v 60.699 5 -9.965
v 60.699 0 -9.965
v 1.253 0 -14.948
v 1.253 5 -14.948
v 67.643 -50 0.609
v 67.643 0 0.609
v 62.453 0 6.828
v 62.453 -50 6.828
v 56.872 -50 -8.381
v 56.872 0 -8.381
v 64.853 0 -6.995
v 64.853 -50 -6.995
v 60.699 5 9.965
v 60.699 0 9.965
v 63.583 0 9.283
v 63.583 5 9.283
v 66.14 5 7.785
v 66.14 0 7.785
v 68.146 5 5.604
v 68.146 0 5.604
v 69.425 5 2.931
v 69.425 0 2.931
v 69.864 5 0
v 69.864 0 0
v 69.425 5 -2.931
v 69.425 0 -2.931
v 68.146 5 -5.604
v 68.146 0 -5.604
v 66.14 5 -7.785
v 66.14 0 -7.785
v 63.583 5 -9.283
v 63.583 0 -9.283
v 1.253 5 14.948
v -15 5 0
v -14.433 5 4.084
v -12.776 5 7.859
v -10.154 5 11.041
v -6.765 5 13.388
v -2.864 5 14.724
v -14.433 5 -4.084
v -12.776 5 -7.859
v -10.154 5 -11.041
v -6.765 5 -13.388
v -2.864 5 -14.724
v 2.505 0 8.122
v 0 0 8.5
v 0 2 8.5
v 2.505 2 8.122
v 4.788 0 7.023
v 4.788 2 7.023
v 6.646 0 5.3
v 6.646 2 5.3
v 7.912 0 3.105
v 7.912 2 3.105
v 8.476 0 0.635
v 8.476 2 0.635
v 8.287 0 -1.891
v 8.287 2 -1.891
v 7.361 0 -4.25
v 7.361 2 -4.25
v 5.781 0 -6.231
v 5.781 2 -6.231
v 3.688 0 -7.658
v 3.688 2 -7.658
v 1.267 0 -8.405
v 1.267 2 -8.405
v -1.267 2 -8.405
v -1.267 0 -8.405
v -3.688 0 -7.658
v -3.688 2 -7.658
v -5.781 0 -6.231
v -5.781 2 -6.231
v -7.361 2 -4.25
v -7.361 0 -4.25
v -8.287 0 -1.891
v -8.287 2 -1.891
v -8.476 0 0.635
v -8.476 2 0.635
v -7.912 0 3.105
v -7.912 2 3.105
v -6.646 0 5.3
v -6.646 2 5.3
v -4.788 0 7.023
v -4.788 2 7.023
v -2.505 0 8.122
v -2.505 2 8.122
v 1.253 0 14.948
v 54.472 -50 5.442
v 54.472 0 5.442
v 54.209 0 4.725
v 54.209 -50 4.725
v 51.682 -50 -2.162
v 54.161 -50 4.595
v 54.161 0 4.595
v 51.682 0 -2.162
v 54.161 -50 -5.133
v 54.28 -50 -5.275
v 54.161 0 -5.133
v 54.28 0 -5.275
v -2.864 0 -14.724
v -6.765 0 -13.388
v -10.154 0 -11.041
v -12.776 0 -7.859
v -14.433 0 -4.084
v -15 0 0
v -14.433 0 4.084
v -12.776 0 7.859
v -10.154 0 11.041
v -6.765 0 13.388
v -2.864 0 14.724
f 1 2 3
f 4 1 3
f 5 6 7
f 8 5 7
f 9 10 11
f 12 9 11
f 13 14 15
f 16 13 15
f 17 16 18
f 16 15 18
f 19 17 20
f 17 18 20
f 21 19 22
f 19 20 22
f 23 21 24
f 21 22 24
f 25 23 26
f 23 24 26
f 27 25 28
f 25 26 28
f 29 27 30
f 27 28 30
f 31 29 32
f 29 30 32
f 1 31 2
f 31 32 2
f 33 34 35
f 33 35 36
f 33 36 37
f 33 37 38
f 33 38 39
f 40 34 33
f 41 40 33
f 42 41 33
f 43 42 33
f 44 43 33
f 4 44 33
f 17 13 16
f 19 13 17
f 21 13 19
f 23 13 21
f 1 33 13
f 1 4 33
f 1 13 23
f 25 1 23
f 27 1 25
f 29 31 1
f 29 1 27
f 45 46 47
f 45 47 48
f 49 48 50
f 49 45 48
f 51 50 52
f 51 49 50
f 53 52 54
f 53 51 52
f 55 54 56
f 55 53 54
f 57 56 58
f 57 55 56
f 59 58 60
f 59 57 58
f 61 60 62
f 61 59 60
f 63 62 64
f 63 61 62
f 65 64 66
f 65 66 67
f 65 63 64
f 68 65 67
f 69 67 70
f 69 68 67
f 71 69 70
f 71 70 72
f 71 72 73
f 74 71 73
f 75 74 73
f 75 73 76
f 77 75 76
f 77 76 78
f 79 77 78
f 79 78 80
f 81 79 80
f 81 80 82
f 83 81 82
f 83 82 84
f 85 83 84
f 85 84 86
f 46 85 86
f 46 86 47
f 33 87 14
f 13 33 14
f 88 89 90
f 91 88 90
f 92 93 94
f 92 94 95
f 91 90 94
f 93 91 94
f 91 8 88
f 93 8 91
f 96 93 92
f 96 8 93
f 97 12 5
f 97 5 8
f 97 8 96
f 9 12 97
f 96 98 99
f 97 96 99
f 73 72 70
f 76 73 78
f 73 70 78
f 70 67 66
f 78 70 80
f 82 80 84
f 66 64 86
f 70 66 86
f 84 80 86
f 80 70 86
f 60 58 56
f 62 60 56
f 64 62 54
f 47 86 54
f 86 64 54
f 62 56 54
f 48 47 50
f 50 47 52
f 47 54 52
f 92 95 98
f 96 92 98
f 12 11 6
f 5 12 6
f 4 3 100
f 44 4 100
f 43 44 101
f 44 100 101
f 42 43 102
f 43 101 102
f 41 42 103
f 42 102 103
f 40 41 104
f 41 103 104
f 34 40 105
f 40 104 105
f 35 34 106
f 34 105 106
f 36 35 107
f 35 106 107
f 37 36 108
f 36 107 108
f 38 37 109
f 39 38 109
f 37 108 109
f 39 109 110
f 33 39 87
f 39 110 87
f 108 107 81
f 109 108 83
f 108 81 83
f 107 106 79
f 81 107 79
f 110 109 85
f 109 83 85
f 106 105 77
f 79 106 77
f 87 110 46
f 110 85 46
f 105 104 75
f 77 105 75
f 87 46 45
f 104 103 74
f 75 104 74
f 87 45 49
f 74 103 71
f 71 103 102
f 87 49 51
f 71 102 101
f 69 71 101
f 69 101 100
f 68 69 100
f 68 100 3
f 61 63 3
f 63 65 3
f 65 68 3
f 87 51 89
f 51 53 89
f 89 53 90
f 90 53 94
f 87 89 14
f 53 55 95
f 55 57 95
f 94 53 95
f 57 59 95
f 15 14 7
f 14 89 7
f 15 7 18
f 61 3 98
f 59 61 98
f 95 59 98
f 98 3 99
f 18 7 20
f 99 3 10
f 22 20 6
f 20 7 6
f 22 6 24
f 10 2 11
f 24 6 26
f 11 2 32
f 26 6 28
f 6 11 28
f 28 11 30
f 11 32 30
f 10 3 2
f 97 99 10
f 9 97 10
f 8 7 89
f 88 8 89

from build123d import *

# Parameters (mm, degrees)
SKETCH_1_R      = 15
SKETCH_1_R_2    = 8.5
SKETCH_1_R_3    = 10
EXTRUDE_5_DEPTH = 5
EXTRUDE_START   = -3
SKETCH_3_R      = 8.5
EXTRUDE_6_DEPTH = 3
EXTRUDE_8_DEPTH = 50


with BuildPart() as part:
    # 草图1 → 凸台-拉伸5 (new body)
    # profile 1 of 3: a face of its own
    with BuildSketch(Plane(origin=(0, 0, 0), x_dir=(1, 0, 0), z_dir=(0, 1, 0))):
        Circle(SKETCH_1_R)
        with Locations(Location((0, 0, 0), (0, 0, 270))):
            Circle(SKETCH_1_R_2, mode=Mode.SUBTRACT)
    # profile 2 of 3: a face of its own
    with BuildSketch(Plane(origin=(0, 0, 0), x_dir=(1, 0, 0), z_dir=(0, 1, 0))):
        with BuildLine():
            Line((60.699439854, 9.965059042), (1.252835242, 14.947588563))
            ThreePointArc((1.252835242, 14.947588563), (11.040664125, 10.154000969), (15, 0))
            ThreePointArc((15, 0), (11.040664125, -10.154000969), (1.252835242, -14.947588563))
            Line((1.252835242, -14.947588563), (60.699439854, -9.965059042))
            ThreePointArc((60.699439854, -9.965059042), (49.864216359, 0), (60.699439854, 9.965059042))
        make_face()
    # profile 3 of 3: a face of its own
    with BuildSketch(Plane(origin=(0, 0, 0), x_dir=(1, 0, 0), z_dir=(0, 1, 0))):
        with Locations((59.864216359, 0)):
            Circle(SKETCH_1_R_3)
    extrude(amount=EXTRUDE_5_DEPTH)

    # 草图3 → 凸台-拉伸6 (add)
    with BuildSketch(Plane(origin=(0, 5, 0), x_dir=(1, 0, 0), z_dir=(0, 1, 0)).offset(EXTRUDE_START)):
        with Locations(Location((0, 0, 0), (0, 0, 270))):
            Circle(SKETCH_3_R)
    extrude(amount=EXTRUDE_6_DEPTH)

    # 草图4 → 凸台-拉伸8 (add)
    with BuildSketch(Plane(origin=(0, 0, 0), x_dir=(-1, 0, 0), z_dir=(0, -1, 0))):
        Polygon((-64.16134725, -4.724526638), (-64.16134725, 5.275473362), (-54.280111118, 5.275473362), (-56.872098045, 8.381028801), (-64.852894721, 6.995424542), (-67.643324571, -0.608950251), (-62.452957745, -6.827720786), (-54.472161069, -5.442116527), (-54.208841033, -4.724526638), align=None)
        Polygon((-51.681731219, 2.162258266), (-54.16134725, 5.133177977), (-54.16134725, -4.595098362), align=None)
        Polygon((-54.280111118, 5.275473362), (-64.16134725, 5.275473362), (-64.16134725, -4.724526638), (-54.208841033, -4.724526638), (-54.16134725, -4.595098362), (-54.16134725, 5.133177977), align=None)
    extrude(amount=EXTRUDE_8_DEPTH)


solid = part.part
